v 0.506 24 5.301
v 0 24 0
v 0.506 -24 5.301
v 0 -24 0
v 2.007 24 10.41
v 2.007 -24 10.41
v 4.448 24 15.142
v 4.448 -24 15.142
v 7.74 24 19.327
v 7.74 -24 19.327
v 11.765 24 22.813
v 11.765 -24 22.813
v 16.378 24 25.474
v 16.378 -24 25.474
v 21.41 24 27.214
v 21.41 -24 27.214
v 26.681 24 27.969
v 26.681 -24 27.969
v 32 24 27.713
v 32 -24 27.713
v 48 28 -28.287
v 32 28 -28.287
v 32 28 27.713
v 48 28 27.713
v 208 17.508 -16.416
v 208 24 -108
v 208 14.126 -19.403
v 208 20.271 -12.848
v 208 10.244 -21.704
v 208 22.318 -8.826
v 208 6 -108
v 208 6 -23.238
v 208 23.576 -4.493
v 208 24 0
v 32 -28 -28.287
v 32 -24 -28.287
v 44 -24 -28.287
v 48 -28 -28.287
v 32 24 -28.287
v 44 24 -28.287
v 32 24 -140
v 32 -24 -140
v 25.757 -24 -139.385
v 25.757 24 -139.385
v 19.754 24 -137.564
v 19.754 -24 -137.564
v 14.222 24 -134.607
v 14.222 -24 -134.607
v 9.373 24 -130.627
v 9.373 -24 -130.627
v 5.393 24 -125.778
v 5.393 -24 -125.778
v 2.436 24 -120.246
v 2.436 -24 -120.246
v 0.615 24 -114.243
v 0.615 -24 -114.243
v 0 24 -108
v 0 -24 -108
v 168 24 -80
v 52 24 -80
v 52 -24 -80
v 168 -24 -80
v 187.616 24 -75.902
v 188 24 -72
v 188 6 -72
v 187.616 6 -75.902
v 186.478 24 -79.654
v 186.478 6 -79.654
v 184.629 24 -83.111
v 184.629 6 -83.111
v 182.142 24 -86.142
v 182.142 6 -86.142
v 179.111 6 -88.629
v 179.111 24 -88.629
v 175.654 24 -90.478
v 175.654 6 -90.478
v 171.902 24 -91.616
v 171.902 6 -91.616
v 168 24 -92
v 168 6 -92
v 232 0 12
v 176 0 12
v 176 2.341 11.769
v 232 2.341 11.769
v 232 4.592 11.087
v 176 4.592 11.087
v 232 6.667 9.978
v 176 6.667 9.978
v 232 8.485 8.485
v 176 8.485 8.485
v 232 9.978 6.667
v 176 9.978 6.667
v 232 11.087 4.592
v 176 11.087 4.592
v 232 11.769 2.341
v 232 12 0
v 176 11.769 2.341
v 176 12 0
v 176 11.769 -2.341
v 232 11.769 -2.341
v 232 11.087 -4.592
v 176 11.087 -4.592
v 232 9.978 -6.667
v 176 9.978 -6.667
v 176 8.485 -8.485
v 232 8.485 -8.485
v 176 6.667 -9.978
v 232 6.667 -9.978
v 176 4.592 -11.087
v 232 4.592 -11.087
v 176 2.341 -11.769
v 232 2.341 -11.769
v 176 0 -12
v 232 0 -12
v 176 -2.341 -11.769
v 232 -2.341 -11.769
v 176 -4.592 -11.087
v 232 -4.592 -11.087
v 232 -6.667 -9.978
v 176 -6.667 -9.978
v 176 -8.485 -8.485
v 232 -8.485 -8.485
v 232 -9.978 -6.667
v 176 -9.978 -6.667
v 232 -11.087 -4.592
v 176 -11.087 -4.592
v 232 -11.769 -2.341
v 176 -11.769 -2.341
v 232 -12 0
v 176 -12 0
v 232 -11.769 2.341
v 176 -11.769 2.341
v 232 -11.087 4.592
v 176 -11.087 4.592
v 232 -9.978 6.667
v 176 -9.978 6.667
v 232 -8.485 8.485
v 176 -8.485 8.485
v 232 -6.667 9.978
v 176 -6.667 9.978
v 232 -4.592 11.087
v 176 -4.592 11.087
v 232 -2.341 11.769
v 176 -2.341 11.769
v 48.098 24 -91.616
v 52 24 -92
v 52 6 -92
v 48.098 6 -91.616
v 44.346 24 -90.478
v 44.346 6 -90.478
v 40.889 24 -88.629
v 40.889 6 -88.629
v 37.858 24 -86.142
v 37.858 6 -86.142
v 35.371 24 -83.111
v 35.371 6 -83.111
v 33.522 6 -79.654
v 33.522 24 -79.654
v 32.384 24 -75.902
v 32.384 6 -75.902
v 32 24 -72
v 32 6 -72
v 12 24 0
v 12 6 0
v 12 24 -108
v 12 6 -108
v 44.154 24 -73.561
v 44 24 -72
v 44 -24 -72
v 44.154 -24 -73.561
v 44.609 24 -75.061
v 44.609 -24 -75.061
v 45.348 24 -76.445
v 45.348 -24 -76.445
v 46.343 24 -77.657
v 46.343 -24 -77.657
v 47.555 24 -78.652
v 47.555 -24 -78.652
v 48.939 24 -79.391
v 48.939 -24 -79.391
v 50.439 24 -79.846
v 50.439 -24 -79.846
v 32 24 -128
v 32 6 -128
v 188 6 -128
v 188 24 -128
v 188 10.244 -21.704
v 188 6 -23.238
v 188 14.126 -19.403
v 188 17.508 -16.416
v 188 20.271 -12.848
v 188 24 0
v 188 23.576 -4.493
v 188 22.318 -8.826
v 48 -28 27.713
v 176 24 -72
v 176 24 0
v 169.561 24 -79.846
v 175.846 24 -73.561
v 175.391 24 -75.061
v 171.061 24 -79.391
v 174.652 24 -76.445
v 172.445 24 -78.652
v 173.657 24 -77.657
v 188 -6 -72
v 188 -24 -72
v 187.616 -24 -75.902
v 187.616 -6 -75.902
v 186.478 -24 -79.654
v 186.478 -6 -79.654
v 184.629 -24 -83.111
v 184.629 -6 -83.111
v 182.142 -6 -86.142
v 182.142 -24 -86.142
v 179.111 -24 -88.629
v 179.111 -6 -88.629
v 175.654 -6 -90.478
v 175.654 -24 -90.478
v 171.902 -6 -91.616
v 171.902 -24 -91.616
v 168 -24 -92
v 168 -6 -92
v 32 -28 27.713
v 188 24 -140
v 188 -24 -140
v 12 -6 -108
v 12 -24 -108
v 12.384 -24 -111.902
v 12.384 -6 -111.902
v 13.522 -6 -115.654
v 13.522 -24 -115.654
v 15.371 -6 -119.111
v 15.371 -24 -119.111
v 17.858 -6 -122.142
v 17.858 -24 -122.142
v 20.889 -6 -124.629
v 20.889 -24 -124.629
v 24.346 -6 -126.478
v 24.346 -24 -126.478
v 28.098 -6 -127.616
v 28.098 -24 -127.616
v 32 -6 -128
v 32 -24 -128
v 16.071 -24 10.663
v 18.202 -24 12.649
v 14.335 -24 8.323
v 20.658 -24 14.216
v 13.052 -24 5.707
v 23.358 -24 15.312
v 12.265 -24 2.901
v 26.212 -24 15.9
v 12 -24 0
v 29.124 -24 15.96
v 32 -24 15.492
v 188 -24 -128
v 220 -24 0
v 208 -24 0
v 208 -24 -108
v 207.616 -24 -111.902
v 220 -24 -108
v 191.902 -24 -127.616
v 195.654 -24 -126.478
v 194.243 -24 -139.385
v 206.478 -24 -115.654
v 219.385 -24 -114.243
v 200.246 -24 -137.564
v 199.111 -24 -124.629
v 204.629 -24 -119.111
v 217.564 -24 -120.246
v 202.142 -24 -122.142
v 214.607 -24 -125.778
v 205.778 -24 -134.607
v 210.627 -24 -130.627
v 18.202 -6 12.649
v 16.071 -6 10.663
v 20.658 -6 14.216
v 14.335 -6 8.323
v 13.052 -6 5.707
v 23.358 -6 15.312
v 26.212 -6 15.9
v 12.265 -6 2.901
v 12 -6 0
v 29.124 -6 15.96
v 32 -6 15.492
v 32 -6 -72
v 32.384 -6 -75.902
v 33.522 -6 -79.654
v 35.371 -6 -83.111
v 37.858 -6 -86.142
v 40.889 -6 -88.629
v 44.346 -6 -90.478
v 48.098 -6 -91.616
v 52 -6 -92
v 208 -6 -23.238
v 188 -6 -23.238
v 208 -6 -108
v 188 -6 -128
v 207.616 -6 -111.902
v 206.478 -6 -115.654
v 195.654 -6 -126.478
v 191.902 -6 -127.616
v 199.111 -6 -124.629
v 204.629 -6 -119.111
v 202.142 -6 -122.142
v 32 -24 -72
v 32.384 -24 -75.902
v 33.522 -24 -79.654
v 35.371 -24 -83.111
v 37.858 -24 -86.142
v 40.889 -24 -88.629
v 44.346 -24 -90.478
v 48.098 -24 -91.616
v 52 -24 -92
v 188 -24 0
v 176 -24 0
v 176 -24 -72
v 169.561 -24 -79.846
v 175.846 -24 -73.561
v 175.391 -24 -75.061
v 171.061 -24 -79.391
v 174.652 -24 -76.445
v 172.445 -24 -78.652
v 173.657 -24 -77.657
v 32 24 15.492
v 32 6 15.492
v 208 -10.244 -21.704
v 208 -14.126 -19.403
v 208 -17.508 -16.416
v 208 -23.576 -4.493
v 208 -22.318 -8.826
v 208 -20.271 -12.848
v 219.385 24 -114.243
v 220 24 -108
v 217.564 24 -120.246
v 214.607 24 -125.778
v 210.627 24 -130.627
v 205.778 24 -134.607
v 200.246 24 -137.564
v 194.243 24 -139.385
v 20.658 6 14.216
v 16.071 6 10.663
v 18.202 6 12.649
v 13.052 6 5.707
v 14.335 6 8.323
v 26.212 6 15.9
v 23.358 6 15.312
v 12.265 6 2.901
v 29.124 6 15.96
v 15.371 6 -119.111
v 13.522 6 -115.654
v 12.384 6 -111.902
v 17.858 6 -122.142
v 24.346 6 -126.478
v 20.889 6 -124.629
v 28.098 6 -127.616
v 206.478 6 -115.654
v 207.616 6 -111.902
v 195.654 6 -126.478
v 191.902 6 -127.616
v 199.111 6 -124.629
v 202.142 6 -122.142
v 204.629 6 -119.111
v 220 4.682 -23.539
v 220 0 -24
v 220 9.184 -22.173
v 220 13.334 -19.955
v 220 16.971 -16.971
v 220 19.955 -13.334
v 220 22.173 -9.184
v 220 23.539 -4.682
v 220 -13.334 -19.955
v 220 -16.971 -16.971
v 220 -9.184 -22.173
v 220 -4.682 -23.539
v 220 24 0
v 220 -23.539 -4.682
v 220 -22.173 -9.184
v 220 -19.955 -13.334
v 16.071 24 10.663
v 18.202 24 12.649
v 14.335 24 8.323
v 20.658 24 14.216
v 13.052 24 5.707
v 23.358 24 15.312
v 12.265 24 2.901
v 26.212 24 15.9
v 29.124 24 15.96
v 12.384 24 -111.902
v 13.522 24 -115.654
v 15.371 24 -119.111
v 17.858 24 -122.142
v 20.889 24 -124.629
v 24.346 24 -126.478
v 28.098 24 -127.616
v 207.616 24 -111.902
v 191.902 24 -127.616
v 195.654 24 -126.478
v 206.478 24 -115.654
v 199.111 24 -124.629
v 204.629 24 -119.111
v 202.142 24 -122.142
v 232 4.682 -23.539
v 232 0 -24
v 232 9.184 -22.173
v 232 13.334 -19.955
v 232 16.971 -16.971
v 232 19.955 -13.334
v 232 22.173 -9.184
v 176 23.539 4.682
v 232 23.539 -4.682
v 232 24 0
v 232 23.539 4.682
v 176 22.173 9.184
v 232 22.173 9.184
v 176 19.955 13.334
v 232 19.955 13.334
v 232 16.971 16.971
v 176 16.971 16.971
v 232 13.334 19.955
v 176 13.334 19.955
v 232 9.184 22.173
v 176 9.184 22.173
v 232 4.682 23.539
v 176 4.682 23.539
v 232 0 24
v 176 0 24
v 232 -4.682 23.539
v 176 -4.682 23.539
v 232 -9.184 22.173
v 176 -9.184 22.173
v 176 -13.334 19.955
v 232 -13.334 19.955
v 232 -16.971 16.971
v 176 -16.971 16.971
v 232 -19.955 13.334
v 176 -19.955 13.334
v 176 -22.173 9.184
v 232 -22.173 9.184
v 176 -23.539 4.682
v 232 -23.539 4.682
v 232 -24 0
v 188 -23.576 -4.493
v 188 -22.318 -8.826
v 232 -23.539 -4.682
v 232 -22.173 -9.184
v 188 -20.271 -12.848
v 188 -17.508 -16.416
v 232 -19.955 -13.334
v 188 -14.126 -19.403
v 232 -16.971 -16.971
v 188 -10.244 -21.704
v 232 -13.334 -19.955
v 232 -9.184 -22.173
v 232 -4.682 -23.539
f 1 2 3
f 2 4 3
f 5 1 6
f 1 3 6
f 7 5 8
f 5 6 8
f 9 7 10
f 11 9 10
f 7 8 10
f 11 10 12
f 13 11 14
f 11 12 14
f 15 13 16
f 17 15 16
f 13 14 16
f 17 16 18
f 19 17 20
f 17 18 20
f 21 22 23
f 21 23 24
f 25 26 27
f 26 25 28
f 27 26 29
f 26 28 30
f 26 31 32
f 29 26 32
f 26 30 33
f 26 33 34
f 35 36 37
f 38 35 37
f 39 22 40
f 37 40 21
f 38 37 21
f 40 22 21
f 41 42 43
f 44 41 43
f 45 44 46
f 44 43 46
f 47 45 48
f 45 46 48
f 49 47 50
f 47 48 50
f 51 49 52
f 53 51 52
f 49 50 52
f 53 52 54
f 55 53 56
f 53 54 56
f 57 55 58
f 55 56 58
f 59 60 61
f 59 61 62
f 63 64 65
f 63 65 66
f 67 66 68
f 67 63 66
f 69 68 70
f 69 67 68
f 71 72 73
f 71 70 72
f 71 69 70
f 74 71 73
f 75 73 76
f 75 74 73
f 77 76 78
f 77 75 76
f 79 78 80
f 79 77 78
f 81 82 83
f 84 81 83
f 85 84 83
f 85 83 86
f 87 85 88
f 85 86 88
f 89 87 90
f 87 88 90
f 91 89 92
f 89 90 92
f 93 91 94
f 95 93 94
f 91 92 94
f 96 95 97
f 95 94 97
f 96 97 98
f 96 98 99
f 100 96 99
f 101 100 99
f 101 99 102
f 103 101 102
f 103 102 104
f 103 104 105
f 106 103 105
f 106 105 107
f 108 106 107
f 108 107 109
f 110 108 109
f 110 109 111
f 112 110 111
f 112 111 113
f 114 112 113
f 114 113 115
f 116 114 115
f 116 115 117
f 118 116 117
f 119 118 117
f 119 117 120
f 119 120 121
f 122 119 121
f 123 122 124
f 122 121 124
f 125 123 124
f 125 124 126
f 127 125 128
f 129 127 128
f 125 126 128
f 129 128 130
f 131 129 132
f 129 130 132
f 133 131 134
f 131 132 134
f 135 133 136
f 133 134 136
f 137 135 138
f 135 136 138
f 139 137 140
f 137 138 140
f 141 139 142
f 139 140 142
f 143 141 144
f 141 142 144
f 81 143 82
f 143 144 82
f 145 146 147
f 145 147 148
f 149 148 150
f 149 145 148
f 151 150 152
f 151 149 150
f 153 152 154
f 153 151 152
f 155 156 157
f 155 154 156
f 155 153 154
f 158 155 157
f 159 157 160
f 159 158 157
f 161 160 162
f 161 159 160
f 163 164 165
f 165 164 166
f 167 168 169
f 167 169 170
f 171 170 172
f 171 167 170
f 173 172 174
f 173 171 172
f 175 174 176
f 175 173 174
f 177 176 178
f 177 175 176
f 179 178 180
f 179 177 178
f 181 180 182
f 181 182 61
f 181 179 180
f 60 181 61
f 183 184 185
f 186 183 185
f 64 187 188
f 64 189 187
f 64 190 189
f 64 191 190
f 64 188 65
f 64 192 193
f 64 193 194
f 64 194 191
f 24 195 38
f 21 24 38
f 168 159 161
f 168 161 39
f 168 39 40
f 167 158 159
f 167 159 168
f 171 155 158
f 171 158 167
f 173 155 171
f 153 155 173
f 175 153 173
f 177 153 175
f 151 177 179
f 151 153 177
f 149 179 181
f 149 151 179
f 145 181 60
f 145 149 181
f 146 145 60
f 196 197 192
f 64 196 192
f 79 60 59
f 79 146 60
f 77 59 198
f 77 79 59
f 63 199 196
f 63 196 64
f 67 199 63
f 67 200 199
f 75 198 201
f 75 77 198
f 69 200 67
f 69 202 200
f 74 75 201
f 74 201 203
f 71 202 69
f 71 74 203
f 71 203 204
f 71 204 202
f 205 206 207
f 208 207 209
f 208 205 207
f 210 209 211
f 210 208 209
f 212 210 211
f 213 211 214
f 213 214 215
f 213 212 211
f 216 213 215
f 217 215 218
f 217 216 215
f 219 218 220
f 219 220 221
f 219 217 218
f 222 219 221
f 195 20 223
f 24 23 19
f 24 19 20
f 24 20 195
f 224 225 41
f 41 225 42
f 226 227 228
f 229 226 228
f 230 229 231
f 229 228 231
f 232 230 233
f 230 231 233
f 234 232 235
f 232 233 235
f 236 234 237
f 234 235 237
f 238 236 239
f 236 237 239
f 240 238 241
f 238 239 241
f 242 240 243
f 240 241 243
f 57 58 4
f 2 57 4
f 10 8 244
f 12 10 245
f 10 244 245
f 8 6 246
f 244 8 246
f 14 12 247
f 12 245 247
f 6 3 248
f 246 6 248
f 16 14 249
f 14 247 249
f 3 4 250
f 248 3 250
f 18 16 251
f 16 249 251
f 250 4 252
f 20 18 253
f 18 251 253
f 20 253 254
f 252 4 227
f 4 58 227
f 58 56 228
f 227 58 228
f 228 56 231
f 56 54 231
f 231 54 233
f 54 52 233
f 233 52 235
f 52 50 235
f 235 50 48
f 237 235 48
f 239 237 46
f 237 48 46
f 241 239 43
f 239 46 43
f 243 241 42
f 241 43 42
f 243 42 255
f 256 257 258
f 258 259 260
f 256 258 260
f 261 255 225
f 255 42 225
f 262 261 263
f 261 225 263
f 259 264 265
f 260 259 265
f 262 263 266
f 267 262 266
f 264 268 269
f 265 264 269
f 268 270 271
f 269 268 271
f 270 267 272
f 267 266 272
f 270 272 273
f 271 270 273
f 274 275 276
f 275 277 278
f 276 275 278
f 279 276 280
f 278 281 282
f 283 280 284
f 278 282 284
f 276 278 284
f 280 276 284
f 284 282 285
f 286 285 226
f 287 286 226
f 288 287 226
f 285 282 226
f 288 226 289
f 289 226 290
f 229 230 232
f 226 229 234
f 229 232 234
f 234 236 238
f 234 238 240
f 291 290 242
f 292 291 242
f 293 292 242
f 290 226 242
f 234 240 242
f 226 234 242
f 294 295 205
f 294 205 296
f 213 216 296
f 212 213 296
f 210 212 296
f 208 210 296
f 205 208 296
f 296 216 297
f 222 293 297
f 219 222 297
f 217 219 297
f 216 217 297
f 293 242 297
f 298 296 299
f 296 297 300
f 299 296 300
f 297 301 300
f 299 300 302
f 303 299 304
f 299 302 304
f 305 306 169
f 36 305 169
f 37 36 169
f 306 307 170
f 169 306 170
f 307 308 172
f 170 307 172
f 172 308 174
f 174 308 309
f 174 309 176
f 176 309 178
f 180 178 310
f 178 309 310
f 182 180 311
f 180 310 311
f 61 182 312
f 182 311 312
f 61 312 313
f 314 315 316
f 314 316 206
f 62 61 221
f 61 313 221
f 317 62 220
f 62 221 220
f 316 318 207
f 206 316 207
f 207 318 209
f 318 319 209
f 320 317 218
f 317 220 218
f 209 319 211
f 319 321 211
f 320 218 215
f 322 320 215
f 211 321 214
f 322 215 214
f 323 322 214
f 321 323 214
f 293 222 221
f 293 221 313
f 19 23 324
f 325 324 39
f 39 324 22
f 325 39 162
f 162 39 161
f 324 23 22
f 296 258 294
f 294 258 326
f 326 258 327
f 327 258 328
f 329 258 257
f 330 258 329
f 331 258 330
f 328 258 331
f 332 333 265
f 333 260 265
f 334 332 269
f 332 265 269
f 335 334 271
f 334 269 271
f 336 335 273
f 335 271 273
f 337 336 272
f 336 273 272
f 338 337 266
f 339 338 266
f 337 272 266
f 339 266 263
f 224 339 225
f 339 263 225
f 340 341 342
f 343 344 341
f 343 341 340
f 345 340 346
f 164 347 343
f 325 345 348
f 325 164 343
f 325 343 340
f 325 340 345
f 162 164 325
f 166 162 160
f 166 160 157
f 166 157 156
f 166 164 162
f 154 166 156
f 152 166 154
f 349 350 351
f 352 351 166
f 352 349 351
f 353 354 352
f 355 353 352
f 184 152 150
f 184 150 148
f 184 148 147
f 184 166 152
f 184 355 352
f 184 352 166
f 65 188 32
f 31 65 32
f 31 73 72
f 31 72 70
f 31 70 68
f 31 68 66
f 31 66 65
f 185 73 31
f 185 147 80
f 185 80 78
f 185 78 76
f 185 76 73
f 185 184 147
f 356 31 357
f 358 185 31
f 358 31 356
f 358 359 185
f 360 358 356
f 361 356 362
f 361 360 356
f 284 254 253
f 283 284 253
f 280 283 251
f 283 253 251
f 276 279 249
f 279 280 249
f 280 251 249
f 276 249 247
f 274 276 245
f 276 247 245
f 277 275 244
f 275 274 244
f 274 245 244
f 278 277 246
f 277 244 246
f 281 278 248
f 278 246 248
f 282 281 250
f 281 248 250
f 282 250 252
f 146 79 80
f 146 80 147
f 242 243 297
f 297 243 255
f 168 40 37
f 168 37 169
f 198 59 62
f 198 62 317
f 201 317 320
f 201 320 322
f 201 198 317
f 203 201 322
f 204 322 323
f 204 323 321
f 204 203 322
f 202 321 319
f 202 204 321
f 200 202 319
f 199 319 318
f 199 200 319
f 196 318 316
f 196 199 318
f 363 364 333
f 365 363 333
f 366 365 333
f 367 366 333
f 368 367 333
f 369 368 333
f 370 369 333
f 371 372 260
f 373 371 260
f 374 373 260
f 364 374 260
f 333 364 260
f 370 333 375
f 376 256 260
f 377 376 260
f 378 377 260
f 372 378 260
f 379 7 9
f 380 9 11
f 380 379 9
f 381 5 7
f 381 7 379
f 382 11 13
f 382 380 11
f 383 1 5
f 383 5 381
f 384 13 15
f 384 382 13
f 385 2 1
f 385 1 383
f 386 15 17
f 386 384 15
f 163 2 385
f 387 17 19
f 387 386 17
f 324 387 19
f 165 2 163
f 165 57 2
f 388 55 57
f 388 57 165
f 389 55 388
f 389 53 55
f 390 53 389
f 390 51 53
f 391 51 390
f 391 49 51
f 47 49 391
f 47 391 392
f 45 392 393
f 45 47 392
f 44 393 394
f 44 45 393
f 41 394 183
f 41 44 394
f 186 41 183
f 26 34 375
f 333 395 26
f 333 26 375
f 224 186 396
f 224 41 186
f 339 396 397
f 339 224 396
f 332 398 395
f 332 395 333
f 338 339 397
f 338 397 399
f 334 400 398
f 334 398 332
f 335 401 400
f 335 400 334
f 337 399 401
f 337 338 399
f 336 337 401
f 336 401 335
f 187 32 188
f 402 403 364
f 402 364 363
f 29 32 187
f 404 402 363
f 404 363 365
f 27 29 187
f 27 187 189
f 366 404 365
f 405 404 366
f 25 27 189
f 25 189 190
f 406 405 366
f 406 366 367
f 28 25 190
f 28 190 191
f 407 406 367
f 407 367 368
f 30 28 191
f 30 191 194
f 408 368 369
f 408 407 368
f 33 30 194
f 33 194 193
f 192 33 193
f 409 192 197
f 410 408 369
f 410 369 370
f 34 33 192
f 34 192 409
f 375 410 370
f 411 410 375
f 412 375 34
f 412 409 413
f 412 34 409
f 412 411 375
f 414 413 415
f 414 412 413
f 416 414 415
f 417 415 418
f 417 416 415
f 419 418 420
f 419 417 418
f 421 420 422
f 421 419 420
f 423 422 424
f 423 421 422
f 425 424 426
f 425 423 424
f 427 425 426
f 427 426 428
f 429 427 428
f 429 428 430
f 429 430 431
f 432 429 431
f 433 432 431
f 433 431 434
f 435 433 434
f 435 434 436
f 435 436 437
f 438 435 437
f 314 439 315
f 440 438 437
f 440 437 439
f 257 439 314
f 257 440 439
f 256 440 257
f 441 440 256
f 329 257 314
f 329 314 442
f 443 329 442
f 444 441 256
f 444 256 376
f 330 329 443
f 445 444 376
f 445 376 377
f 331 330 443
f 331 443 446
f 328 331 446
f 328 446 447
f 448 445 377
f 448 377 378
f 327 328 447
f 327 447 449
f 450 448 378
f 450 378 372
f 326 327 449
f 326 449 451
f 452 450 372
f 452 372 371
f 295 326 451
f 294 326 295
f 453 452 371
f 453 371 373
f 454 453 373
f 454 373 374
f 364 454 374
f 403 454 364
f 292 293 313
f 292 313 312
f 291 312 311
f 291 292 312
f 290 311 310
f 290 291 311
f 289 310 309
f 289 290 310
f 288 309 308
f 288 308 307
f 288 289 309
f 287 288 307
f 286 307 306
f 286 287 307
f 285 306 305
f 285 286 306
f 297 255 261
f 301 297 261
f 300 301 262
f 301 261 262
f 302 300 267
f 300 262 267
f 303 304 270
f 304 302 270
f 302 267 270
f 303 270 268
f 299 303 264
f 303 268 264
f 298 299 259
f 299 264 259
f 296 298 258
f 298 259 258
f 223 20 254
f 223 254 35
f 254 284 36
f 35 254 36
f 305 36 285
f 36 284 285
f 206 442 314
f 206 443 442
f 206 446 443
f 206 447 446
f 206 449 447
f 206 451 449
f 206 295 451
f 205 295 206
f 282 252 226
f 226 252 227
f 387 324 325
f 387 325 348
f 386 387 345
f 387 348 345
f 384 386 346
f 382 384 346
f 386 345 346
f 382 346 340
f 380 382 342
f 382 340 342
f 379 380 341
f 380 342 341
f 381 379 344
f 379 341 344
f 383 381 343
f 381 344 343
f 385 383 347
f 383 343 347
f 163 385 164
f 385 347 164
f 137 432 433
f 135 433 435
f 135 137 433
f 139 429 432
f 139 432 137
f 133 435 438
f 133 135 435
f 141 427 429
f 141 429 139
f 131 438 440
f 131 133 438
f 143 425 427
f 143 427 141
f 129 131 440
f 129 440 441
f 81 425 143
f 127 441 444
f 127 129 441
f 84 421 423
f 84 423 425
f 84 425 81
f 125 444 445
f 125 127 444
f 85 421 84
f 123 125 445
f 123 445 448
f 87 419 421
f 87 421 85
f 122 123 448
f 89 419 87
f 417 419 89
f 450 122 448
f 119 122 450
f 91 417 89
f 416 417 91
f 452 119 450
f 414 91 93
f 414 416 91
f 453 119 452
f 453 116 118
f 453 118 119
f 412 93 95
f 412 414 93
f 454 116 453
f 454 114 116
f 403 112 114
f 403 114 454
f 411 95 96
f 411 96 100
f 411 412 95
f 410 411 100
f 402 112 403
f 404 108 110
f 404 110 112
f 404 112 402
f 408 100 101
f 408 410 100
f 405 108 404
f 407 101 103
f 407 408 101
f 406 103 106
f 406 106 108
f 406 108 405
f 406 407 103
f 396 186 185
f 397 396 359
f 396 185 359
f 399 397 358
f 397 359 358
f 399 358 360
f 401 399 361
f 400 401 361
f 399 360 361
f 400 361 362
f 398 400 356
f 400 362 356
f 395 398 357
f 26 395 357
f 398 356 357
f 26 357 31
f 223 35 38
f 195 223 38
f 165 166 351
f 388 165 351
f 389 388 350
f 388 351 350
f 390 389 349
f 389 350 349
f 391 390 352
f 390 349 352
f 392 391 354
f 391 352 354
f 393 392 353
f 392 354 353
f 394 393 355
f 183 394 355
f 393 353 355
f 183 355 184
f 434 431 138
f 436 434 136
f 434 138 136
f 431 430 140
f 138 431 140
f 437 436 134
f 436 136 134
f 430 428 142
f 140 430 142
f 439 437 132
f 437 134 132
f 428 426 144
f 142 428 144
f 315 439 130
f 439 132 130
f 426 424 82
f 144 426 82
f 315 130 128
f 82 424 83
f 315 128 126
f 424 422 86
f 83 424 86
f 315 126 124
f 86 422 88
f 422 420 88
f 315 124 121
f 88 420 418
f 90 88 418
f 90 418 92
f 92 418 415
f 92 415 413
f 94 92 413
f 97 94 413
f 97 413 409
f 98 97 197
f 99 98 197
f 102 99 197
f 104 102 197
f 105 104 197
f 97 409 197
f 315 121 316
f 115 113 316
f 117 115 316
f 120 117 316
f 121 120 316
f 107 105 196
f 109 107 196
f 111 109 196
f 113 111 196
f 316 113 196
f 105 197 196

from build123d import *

# Parameters (mm, degrees)
BOSS_EXTRUDE2_DEPTH       = 6
BOSS_EXTRUDE3_DEPTH       = 24
BOSS_EXTRUDE5_START       = 12
SKETCH7_R                 = 24
BOSS_EXTRUDE5_DEPTH       = 56
BOSS_EXTRUDE6_START       = 4
SKETCH4_W                 = 16
SKETCH4_H                 = 56
BOSS_EXTRUDE6_DEPTH       = 56
M24_CLEARANCE_SLOT4_D     = 24
M24_CLEARANCE_SLOT4_DEPTH = 56


with BuildPart() as part:
    # Sketch1 → Boss-Extrude2 (new, symmetric)
    with BuildSketch(Plane(origin=(0, 0, 0), x_dir=(1, 0, 0), z_dir=(0, 1, 0))):
        with BuildLine():
            ThreePointArc((12, 0), (18.202041029, -12.649110641), (32, -15.491933385))
            Line((32, -15.491933385), (32, 0))
            Line((32, 0), (32, 72))
            ThreePointArc((32, 72), (37.857864376, 86.142135624), (52, 92))
            Line((52, 92), (168, 92))
            ThreePointArc((168, 92), (182.142135624, 86.142135624), (188, 72))
            Line((188, 72), (188, 0))
            Line((188, 0), (208, 0))
            Line((208, 0), (208, 108))
            ThreePointArc((208, 108), (202.142135624, 122.142135624), (188, 128))
            Line((188, 128), (32, 128))
            ThreePointArc((32, 128), (17.857864376, 122.142135624), (12, 108))
            Line((12, 108), (12, 0))
        make_face()
    extrude(amount=BOSS_EXTRUDE2_DEPTH, both=True)

    # Sketch1<4> → Boss-Extrude3 (add, symmetric)
    with BuildSketch(Plane(origin=(0, 0, 0), x_dir=(1, 0, 0), z_dir=(0, 1, 0))):
        with BuildLine():
            Line((0, 108), (0, 0))
            ThreePointArc((0, 0), (9.66969722, -21.166010489), (32, -27.712812921))
            Line((32, -27.712812921), (32, -15.491933385))
            ThreePointArc((32, -15.491933385), (18.202041029, -12.649110641), (12, 0))
            Line((12, 0), (12, 108))
            ThreePointArc((12, 108), (17.857864376, 122.142135624), (32, 128))
            Line((32, 128), (188, 128))
            ThreePointArc((188, 128), (202.142135624, 122.142135624), (208, 108))
            Line((208, 108), (208, 0))
            Line((208, 0), (220, 0))
            Line((220, 0), (220, 108))
            ThreePointArc((220, 108), (210.627416998, 130.627416998), (188, 140))
            Line((188, 140), (32, 140))
            ThreePointArc((32, 140), (9.372583002, 130.627416998), (0, 108))
        make_face()
        with BuildLine():
            Line((32, 72), (32, 0))
            Line((32, 0), (44, 0))
            Line((44, 0), (44, 72))
            ThreePointArc((44, 72), (46.343145751, 77.656854249), (52, 80))
            Line((52, 80), (168, 80))
            ThreePointArc((168, 80), (173.656854249, 77.656854249), (176, 72))
            Line((176, 72), (176, 0))
            Line((176, 0), (188, 0))
            Line((188, 0), (188, 72))
            ThreePointArc((188, 72), (182.142135624, 86.142135624), (168, 92))
            Line((168, 92), (52, 92))
            ThreePointArc((52, 92), (37.857864376, 86.142135624), (32, 72))
        make_face()
    extrude(amount=BOSS_EXTRUDE3_DEPTH, both=True)

    # Sketch7 → Boss-Extrude5 (add)
    with BuildSketch(Plane(origin=(220, 0, 0), x_dir=(0, 0, -1), z_dir=(1, 0, 0)).offset(BOSS_EXTRUDE5_START)):
        Circle(SKETCH7_R)
    extrude(amount=-BOSS_EXTRUDE5_DEPTH)

    # Sketch4 → Boss-Extrude6 (add)
    with BuildSketch(Plane(origin=(0, 24, 0), x_dir=(1, 0, 0), z_dir=(0, 1, 0)).offset(BOSS_EXTRUDE6_START)):
        with Locations((40, 0.287187079)):
            Rectangle(SKETCH4_W, SKETCH4_H)
    extrude(amount=-BOSS_EXTRUDE6_DEPTH)

    # M24 Clearance Slot4
    with Locations(Plane(origin=(232, 0, 0), x_dir=(0, 0, -1), z_dir=(1, 0, 0))):
        with Locations((0, 0)):
            Hole(M24_CLEARANCE_SLOT4_D / 2, depth=M24_CLEARANCE_SLOT4_DEPTH)


solid = part.part
